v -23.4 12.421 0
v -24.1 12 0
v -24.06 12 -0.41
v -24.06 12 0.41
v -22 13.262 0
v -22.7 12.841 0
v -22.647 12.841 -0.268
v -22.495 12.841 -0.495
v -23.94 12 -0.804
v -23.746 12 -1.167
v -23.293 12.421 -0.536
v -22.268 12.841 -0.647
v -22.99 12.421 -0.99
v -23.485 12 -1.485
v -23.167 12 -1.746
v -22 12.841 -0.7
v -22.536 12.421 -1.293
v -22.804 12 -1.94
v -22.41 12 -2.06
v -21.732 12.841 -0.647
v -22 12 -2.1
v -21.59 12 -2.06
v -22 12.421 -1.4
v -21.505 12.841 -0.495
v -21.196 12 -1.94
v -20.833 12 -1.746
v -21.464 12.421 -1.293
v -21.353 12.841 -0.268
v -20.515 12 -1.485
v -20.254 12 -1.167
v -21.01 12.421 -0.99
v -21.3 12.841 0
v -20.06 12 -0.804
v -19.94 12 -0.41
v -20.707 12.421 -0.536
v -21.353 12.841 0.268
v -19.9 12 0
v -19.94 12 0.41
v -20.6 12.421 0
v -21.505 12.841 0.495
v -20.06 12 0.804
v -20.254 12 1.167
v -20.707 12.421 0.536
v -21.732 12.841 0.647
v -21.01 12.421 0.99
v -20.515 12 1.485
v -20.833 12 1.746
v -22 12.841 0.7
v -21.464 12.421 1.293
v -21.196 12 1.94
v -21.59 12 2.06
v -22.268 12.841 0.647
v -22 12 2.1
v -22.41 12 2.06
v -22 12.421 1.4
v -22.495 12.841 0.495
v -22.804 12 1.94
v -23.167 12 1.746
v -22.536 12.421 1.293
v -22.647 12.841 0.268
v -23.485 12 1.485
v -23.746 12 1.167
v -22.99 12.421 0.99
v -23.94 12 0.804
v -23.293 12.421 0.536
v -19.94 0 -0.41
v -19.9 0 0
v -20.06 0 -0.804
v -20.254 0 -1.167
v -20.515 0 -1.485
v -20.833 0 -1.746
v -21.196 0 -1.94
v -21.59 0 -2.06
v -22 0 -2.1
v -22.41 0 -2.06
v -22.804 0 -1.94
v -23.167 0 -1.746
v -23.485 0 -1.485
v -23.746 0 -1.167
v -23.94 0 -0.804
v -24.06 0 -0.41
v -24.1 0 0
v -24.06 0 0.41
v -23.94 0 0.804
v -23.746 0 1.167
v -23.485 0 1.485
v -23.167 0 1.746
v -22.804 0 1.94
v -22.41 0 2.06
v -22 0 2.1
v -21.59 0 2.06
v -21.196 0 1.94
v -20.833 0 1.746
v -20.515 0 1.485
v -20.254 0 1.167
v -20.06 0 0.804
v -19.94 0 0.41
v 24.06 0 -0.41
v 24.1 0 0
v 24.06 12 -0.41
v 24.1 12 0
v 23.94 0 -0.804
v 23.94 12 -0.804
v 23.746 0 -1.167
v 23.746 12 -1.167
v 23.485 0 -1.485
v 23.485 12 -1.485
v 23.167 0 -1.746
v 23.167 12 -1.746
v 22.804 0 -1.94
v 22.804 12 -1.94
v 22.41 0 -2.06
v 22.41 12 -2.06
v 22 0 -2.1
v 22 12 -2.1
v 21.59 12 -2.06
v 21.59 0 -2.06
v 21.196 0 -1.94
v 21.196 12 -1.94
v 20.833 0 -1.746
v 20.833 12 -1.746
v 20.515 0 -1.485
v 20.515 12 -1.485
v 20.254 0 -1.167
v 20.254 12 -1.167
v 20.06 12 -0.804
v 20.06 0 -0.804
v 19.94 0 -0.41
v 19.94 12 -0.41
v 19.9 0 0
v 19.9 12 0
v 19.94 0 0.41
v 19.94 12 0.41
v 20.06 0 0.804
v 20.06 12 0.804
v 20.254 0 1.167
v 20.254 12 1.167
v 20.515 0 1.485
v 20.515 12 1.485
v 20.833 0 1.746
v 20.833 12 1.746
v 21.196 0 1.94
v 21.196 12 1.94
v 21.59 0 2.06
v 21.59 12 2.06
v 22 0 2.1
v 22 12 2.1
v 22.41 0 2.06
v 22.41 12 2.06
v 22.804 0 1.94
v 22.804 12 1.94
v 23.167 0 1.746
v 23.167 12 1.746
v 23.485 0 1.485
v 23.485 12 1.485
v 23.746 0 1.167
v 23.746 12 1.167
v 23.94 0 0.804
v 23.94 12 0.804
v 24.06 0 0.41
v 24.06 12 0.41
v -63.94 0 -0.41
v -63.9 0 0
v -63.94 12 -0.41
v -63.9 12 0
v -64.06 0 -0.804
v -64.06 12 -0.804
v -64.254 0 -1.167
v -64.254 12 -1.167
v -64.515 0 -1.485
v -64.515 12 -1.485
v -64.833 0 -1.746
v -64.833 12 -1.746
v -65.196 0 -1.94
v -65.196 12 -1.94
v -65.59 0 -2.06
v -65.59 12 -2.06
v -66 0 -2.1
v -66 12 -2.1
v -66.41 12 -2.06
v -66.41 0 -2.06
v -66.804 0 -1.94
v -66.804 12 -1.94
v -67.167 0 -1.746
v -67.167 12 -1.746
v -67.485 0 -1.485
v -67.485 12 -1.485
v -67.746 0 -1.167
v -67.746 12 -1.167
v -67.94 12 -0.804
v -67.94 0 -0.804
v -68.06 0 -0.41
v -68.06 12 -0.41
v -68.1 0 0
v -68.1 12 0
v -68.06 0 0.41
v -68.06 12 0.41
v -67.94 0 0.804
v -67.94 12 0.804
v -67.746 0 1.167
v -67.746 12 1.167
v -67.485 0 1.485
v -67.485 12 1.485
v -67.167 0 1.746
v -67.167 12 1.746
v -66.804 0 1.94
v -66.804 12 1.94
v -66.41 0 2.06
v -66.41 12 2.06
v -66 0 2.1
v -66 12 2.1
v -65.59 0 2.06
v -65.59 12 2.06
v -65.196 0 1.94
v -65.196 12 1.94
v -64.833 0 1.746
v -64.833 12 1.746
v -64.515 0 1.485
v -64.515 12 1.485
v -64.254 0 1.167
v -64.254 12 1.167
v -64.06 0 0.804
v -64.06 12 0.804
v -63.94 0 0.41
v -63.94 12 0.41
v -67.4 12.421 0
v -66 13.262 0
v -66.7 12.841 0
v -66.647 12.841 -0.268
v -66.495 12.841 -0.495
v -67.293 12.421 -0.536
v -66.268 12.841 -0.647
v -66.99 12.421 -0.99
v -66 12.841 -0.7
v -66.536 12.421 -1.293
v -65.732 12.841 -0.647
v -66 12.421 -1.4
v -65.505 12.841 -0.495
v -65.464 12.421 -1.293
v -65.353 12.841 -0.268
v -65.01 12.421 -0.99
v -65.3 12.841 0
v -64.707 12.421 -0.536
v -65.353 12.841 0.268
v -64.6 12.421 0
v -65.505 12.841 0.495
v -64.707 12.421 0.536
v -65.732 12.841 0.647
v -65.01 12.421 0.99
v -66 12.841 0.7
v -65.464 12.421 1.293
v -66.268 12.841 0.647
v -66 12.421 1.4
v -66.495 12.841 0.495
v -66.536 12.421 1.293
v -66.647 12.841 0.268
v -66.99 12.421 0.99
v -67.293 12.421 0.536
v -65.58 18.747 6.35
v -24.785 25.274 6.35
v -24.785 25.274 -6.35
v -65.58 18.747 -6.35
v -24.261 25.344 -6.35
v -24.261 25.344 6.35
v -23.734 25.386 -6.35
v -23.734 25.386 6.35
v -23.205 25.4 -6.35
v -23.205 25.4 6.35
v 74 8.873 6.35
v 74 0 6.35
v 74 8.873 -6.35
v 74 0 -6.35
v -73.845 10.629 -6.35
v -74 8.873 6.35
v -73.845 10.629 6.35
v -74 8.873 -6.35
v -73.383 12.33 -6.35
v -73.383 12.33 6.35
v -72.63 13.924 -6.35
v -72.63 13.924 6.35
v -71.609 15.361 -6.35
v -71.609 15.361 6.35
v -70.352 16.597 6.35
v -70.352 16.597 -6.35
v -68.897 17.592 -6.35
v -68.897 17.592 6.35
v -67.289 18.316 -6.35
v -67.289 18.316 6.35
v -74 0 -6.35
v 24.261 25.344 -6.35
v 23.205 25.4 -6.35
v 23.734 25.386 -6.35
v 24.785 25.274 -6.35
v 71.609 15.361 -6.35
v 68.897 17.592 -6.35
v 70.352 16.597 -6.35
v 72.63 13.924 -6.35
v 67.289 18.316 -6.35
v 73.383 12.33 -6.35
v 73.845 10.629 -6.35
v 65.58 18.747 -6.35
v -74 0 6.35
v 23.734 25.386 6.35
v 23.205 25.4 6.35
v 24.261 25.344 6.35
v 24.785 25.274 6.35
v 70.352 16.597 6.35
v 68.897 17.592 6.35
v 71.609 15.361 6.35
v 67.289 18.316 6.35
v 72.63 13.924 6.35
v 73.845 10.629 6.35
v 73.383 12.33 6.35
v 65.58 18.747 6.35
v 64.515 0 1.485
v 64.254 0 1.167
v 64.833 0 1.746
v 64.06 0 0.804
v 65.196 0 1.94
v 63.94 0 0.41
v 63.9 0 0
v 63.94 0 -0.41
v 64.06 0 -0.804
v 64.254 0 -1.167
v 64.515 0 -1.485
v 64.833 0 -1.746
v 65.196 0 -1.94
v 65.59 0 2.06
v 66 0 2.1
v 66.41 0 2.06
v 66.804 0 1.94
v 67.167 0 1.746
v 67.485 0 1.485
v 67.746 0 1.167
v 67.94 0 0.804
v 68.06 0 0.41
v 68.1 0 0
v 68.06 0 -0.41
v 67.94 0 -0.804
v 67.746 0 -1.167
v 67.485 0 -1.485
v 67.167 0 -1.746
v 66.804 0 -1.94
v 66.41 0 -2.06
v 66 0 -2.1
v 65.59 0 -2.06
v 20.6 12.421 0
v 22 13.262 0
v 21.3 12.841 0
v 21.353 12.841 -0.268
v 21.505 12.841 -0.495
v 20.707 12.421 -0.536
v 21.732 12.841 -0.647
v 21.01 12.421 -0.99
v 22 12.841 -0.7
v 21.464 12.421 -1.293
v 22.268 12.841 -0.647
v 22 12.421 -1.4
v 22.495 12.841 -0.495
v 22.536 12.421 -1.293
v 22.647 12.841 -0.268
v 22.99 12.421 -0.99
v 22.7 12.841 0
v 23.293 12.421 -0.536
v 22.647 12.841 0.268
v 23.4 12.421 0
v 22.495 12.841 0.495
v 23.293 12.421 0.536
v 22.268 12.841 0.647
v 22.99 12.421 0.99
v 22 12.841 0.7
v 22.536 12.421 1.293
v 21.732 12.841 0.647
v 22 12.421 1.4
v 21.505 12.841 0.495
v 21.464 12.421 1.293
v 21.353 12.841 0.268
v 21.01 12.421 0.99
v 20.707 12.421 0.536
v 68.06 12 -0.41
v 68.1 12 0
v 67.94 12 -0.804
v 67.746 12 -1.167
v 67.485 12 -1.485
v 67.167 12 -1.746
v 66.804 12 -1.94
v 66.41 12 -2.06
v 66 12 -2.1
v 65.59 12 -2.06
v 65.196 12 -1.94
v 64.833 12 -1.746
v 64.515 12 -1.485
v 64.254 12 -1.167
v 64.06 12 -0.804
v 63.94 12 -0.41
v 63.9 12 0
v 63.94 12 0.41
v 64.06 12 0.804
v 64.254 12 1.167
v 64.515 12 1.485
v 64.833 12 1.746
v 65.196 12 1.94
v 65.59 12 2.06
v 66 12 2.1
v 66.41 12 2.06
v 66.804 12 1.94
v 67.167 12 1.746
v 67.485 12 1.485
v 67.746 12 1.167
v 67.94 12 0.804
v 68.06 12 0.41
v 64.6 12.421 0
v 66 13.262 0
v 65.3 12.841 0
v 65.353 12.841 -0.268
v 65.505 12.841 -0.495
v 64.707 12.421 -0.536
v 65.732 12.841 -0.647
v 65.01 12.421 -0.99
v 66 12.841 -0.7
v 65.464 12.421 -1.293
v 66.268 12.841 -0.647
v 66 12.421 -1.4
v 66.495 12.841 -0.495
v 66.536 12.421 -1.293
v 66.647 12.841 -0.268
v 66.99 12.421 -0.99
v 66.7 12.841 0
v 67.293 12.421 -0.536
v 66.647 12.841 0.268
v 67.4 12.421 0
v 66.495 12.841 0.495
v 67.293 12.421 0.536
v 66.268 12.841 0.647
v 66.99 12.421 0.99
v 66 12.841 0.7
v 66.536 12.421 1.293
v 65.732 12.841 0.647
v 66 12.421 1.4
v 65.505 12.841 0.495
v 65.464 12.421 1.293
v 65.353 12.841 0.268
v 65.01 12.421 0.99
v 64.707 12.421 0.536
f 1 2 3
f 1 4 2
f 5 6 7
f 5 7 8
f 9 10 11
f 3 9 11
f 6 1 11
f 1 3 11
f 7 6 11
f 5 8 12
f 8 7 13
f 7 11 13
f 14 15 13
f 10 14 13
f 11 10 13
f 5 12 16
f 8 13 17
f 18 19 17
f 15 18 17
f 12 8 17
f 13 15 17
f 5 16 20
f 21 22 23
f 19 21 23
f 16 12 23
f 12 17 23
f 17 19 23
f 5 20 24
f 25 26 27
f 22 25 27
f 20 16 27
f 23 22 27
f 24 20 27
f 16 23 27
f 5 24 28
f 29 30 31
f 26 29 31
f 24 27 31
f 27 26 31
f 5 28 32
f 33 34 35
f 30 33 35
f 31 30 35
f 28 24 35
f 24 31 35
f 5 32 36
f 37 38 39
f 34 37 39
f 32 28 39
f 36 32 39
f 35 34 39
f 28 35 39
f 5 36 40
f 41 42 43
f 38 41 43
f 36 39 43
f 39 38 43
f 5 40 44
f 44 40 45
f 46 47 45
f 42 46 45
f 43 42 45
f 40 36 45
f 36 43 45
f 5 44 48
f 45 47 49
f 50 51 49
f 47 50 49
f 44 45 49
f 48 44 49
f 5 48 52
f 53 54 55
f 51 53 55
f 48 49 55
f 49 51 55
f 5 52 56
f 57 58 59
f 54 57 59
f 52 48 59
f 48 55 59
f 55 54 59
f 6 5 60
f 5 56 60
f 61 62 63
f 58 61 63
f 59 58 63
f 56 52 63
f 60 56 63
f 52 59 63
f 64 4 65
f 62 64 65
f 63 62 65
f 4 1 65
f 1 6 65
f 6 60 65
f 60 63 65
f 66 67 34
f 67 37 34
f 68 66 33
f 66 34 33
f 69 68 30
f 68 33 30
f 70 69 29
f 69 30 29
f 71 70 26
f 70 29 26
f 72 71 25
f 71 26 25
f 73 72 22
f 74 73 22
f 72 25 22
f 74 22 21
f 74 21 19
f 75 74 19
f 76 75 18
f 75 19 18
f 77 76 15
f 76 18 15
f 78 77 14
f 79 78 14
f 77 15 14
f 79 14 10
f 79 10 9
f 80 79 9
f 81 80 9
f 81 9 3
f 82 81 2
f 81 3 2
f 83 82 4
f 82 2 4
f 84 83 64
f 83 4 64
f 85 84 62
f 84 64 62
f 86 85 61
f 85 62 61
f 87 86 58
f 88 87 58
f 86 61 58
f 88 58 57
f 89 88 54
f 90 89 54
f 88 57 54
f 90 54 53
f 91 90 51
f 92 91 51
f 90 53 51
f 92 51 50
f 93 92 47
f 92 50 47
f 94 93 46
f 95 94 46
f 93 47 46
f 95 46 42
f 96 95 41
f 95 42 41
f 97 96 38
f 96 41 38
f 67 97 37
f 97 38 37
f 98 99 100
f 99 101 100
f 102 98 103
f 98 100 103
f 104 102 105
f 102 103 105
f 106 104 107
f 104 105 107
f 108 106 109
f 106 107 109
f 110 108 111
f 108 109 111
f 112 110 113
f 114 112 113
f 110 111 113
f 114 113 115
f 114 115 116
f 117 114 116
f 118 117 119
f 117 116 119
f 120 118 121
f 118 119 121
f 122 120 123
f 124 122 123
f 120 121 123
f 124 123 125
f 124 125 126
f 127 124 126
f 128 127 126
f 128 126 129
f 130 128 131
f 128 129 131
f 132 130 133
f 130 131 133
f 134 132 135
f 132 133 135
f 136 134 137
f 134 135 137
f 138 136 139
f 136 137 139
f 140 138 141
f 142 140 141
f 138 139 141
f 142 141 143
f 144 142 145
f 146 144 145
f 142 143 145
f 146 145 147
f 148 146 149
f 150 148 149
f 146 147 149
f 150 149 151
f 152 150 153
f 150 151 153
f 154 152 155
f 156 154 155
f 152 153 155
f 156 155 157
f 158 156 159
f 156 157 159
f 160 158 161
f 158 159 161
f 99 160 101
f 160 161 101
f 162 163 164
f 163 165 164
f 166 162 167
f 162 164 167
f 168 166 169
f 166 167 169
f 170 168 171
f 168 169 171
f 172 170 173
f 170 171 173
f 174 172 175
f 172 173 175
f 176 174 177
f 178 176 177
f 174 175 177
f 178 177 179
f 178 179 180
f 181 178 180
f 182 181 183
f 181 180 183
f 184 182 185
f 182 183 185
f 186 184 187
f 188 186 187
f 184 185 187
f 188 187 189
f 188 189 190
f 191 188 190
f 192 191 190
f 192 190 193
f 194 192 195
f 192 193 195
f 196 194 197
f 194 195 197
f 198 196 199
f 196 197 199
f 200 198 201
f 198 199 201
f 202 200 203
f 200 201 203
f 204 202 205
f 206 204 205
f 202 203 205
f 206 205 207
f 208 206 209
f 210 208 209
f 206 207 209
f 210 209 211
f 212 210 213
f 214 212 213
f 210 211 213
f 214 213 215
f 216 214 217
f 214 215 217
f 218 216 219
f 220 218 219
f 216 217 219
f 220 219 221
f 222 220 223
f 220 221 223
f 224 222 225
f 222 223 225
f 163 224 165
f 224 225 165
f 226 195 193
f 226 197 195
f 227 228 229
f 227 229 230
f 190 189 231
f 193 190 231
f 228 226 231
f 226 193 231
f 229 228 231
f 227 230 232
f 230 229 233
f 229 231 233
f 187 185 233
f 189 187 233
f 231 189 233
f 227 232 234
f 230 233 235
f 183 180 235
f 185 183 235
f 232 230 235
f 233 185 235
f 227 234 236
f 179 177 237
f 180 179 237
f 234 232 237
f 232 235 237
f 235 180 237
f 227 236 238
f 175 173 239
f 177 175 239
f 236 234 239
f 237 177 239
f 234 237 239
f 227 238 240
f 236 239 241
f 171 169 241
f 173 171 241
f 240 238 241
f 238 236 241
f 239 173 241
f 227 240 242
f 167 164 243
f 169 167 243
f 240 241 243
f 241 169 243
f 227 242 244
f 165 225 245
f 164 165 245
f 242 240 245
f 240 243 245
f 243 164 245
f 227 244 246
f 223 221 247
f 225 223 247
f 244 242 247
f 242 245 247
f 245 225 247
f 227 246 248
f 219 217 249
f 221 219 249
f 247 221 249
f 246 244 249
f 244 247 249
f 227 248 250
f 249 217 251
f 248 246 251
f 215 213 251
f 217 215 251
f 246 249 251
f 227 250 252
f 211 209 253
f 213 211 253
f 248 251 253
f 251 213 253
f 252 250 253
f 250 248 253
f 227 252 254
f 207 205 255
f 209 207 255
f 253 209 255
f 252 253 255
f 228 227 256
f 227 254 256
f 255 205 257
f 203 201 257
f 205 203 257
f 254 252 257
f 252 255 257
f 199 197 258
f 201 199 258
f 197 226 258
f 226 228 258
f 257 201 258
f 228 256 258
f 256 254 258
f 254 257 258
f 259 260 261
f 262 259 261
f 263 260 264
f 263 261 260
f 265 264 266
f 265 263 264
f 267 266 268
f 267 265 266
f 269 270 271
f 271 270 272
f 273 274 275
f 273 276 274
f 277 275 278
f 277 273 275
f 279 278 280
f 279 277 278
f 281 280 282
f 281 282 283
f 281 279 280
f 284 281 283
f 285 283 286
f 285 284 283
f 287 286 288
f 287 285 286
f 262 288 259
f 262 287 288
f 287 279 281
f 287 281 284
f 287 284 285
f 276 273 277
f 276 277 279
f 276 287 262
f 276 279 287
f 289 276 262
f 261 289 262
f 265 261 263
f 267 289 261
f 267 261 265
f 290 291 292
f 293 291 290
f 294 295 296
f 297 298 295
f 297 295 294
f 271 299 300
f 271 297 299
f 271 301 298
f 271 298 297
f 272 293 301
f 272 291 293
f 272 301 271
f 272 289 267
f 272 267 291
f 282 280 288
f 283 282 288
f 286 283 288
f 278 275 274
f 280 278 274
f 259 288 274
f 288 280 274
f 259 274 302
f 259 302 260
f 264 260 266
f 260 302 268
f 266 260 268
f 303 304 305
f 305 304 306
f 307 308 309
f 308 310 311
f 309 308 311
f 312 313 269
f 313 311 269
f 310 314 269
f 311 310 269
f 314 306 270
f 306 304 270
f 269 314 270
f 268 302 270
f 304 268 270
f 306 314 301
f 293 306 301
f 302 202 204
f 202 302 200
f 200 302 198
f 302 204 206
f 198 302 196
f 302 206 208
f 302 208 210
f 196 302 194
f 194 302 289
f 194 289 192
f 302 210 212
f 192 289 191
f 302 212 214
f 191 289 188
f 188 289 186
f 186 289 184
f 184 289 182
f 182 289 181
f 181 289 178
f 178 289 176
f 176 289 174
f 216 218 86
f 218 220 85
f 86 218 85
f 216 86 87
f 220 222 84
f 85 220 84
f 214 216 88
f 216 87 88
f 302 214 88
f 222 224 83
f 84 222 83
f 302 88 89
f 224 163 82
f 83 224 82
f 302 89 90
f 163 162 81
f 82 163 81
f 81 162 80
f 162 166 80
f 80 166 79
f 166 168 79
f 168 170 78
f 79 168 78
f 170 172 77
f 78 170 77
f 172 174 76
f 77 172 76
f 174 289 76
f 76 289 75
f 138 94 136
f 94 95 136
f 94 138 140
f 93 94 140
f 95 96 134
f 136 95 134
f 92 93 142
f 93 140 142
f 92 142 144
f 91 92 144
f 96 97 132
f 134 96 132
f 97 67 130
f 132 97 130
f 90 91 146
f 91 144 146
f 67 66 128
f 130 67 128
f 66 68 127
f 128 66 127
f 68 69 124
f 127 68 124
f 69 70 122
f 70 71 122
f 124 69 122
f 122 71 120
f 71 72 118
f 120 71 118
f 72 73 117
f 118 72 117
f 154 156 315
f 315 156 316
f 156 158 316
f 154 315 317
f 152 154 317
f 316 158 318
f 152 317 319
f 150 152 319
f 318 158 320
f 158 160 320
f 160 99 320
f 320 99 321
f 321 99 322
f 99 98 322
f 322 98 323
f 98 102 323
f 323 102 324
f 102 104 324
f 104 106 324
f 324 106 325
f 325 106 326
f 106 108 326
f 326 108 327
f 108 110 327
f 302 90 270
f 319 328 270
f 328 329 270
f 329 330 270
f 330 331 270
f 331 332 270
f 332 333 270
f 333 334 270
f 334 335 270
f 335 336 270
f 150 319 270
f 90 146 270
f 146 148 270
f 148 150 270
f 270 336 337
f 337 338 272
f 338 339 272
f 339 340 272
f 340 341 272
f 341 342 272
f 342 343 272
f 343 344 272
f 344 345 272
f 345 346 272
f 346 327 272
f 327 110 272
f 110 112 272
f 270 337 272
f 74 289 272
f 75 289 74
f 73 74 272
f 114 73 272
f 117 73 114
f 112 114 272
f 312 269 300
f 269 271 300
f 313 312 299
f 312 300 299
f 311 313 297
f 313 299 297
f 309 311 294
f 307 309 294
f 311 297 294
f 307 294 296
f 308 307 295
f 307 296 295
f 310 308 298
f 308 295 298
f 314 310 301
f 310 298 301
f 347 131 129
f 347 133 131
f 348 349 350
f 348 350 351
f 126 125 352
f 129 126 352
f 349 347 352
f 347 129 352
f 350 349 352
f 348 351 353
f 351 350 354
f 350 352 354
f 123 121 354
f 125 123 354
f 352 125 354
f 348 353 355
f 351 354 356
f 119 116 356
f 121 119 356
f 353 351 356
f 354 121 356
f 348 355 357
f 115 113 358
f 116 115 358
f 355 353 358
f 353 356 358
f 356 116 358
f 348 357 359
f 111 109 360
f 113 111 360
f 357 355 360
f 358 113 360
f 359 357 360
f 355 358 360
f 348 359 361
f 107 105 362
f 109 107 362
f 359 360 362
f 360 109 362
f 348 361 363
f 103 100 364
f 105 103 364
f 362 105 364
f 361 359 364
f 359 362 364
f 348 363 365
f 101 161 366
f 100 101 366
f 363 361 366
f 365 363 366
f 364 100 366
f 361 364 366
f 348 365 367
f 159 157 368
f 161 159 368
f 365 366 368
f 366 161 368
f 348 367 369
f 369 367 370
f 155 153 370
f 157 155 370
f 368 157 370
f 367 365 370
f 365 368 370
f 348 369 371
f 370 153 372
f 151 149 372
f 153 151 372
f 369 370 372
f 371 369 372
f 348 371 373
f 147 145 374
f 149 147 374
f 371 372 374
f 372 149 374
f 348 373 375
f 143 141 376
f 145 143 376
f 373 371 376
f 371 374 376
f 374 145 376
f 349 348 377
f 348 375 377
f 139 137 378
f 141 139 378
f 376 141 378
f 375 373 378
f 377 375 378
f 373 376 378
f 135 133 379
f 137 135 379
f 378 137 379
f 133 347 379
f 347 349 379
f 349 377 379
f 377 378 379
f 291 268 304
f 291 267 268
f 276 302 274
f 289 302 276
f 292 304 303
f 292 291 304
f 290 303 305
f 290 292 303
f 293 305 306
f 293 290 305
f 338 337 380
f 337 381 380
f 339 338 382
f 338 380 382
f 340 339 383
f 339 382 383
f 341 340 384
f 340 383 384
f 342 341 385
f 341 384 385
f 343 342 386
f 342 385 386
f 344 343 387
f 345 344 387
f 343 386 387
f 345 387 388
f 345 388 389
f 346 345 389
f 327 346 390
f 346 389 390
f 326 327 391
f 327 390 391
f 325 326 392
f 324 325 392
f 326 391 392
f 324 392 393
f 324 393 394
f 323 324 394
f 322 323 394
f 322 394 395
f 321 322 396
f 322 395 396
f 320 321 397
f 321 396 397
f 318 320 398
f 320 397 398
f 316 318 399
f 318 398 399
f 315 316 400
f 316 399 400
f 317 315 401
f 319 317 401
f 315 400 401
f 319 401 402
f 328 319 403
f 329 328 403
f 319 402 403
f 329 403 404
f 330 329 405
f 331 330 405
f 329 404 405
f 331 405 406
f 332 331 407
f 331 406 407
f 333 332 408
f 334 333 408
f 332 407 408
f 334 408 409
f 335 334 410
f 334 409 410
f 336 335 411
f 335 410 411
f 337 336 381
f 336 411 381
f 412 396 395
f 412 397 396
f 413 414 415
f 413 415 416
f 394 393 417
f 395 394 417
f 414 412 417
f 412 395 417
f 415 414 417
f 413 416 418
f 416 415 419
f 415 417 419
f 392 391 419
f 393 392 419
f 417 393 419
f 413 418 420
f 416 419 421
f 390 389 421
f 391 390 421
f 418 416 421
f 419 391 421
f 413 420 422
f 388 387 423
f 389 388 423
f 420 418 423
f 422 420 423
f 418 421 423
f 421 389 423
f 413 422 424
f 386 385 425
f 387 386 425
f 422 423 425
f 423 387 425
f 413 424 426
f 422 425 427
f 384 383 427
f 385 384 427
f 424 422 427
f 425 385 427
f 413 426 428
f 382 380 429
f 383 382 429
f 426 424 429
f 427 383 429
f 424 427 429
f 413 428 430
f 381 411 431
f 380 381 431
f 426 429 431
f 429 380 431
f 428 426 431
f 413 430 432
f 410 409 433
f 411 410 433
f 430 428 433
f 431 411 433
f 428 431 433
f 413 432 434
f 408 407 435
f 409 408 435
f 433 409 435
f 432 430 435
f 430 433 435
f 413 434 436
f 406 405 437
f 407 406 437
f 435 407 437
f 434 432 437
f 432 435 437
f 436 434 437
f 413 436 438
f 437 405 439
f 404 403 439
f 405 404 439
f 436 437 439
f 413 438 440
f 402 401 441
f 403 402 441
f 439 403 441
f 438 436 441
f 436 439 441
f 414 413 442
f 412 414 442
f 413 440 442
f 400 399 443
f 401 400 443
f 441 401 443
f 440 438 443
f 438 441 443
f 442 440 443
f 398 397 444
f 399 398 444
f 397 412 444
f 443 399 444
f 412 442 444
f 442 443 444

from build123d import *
from OCP.BRepFilletAPI import BRepFilletAPI_MakeChamfer

# Parameters (mm, degrees)
SKETCH1_W                 = 148
SKETCH1_H                 = 12.7
BOSS_EXTRUDE1_DEPTH       = 25.4
CHAMFER1_SIZE             = 8
CHAMFER1_SIZE2            = 50
M5X0_8_TAPPED_HOLE1_D     = 4.2
M5X0_8_TAPPED_HOLE1_DEPTH = 12
M5X0_8_TAPPED_HOLE1_TIP   = 1.2618073
FILLET1_R                 = 10


with BuildPart() as part:
    # Sketch1 → Boss-Extrude1 (new body)
    with BuildSketch(Plane(origin=(0, 0, 0), x_dir=(1, 0, 0), z_dir=(0, 1, 0))):
        Rectangle(SKETCH1_W, SKETCH1_H)
    extrude(amount=BOSS_EXTRUDE1_DEPTH)

    # Chamfer1: one chamfer whose edges measure the first distance from different faces: ONE call of the kernel's chamfer builder (chamfer() names one face for all edges)
    chamfer1_edges_1 = [part.edges().sort_by_distance(p)[0] for p in [
        (-74, 25.4, 0),
    ]]
    chamfer1_side_1 = [part.faces().sort_by_distance(p)[0] for p in [
        (-74, 12.7, 0),
    ]]
    chamfer1_edges_2 = [part.edges().sort_by_distance(p)[0] for p in [
        (74, 25.4, 0),
    ]]
    chamfer1_side_2 = [part.faces().sort_by_distance(p)[0] for p in [
        (74, 12.7, 0),
    ]]
    chamfer1 = BRepFilletAPI_MakeChamfer(part.part.solid().wrapped)
    for e in chamfer1_edges_1:
        chamfer1.Add(CHAMFER1_SIZE, CHAMFER1_SIZE2, e.wrapped, chamfer1_side_1[0].wrapped)  # the first distance lies on this face
    for e in chamfer1_edges_2:
        chamfer1.Add(CHAMFER1_SIZE, CHAMFER1_SIZE2, e.wrapped, chamfer1_side_2[0].wrapped)  # the first distance lies on this face
    add(Compound.cast(chamfer1.Shape()), mode=Mode.REPLACE)

    # M5x0.8 Tapped Hole1
    with Locations(Plane(origin=(0, 0, 0), x_dir=(-1, 0, 0), z_dir=(0, -1, 0))):
        with Locations((66, 0), (22, 0), (-22, 0), (-66, 0)):
            Hole(M5X0_8_TAPPED_HOLE1_D / 2, depth=M5X0_8_TAPPED_HOLE1_DEPTH)
            with Locations((0, 0, -(M5X0_8_TAPPED_HOLE1_DEPTH + M5X0_8_TAPPED_HOLE1_TIP / 2))):  # 118° drill point
                Cone(0, M5X0_8_TAPPED_HOLE1_D / 2, M5X0_8_TAPPED_HOLE1_TIP, mode=Mode.SUBTRACT)

    # Fillet1
    fillet1_edges = [part.edges().sort_by_distance(p)[0] for p in [
        (-24, 25.4, 0),
        (24, 25.4, 0),
        (74, 17.4, 0),
        (-74, 17.4, 0),
    ]]
    fillet(fillet1_edges, radius=FILLET1_R)


solid = part.part
